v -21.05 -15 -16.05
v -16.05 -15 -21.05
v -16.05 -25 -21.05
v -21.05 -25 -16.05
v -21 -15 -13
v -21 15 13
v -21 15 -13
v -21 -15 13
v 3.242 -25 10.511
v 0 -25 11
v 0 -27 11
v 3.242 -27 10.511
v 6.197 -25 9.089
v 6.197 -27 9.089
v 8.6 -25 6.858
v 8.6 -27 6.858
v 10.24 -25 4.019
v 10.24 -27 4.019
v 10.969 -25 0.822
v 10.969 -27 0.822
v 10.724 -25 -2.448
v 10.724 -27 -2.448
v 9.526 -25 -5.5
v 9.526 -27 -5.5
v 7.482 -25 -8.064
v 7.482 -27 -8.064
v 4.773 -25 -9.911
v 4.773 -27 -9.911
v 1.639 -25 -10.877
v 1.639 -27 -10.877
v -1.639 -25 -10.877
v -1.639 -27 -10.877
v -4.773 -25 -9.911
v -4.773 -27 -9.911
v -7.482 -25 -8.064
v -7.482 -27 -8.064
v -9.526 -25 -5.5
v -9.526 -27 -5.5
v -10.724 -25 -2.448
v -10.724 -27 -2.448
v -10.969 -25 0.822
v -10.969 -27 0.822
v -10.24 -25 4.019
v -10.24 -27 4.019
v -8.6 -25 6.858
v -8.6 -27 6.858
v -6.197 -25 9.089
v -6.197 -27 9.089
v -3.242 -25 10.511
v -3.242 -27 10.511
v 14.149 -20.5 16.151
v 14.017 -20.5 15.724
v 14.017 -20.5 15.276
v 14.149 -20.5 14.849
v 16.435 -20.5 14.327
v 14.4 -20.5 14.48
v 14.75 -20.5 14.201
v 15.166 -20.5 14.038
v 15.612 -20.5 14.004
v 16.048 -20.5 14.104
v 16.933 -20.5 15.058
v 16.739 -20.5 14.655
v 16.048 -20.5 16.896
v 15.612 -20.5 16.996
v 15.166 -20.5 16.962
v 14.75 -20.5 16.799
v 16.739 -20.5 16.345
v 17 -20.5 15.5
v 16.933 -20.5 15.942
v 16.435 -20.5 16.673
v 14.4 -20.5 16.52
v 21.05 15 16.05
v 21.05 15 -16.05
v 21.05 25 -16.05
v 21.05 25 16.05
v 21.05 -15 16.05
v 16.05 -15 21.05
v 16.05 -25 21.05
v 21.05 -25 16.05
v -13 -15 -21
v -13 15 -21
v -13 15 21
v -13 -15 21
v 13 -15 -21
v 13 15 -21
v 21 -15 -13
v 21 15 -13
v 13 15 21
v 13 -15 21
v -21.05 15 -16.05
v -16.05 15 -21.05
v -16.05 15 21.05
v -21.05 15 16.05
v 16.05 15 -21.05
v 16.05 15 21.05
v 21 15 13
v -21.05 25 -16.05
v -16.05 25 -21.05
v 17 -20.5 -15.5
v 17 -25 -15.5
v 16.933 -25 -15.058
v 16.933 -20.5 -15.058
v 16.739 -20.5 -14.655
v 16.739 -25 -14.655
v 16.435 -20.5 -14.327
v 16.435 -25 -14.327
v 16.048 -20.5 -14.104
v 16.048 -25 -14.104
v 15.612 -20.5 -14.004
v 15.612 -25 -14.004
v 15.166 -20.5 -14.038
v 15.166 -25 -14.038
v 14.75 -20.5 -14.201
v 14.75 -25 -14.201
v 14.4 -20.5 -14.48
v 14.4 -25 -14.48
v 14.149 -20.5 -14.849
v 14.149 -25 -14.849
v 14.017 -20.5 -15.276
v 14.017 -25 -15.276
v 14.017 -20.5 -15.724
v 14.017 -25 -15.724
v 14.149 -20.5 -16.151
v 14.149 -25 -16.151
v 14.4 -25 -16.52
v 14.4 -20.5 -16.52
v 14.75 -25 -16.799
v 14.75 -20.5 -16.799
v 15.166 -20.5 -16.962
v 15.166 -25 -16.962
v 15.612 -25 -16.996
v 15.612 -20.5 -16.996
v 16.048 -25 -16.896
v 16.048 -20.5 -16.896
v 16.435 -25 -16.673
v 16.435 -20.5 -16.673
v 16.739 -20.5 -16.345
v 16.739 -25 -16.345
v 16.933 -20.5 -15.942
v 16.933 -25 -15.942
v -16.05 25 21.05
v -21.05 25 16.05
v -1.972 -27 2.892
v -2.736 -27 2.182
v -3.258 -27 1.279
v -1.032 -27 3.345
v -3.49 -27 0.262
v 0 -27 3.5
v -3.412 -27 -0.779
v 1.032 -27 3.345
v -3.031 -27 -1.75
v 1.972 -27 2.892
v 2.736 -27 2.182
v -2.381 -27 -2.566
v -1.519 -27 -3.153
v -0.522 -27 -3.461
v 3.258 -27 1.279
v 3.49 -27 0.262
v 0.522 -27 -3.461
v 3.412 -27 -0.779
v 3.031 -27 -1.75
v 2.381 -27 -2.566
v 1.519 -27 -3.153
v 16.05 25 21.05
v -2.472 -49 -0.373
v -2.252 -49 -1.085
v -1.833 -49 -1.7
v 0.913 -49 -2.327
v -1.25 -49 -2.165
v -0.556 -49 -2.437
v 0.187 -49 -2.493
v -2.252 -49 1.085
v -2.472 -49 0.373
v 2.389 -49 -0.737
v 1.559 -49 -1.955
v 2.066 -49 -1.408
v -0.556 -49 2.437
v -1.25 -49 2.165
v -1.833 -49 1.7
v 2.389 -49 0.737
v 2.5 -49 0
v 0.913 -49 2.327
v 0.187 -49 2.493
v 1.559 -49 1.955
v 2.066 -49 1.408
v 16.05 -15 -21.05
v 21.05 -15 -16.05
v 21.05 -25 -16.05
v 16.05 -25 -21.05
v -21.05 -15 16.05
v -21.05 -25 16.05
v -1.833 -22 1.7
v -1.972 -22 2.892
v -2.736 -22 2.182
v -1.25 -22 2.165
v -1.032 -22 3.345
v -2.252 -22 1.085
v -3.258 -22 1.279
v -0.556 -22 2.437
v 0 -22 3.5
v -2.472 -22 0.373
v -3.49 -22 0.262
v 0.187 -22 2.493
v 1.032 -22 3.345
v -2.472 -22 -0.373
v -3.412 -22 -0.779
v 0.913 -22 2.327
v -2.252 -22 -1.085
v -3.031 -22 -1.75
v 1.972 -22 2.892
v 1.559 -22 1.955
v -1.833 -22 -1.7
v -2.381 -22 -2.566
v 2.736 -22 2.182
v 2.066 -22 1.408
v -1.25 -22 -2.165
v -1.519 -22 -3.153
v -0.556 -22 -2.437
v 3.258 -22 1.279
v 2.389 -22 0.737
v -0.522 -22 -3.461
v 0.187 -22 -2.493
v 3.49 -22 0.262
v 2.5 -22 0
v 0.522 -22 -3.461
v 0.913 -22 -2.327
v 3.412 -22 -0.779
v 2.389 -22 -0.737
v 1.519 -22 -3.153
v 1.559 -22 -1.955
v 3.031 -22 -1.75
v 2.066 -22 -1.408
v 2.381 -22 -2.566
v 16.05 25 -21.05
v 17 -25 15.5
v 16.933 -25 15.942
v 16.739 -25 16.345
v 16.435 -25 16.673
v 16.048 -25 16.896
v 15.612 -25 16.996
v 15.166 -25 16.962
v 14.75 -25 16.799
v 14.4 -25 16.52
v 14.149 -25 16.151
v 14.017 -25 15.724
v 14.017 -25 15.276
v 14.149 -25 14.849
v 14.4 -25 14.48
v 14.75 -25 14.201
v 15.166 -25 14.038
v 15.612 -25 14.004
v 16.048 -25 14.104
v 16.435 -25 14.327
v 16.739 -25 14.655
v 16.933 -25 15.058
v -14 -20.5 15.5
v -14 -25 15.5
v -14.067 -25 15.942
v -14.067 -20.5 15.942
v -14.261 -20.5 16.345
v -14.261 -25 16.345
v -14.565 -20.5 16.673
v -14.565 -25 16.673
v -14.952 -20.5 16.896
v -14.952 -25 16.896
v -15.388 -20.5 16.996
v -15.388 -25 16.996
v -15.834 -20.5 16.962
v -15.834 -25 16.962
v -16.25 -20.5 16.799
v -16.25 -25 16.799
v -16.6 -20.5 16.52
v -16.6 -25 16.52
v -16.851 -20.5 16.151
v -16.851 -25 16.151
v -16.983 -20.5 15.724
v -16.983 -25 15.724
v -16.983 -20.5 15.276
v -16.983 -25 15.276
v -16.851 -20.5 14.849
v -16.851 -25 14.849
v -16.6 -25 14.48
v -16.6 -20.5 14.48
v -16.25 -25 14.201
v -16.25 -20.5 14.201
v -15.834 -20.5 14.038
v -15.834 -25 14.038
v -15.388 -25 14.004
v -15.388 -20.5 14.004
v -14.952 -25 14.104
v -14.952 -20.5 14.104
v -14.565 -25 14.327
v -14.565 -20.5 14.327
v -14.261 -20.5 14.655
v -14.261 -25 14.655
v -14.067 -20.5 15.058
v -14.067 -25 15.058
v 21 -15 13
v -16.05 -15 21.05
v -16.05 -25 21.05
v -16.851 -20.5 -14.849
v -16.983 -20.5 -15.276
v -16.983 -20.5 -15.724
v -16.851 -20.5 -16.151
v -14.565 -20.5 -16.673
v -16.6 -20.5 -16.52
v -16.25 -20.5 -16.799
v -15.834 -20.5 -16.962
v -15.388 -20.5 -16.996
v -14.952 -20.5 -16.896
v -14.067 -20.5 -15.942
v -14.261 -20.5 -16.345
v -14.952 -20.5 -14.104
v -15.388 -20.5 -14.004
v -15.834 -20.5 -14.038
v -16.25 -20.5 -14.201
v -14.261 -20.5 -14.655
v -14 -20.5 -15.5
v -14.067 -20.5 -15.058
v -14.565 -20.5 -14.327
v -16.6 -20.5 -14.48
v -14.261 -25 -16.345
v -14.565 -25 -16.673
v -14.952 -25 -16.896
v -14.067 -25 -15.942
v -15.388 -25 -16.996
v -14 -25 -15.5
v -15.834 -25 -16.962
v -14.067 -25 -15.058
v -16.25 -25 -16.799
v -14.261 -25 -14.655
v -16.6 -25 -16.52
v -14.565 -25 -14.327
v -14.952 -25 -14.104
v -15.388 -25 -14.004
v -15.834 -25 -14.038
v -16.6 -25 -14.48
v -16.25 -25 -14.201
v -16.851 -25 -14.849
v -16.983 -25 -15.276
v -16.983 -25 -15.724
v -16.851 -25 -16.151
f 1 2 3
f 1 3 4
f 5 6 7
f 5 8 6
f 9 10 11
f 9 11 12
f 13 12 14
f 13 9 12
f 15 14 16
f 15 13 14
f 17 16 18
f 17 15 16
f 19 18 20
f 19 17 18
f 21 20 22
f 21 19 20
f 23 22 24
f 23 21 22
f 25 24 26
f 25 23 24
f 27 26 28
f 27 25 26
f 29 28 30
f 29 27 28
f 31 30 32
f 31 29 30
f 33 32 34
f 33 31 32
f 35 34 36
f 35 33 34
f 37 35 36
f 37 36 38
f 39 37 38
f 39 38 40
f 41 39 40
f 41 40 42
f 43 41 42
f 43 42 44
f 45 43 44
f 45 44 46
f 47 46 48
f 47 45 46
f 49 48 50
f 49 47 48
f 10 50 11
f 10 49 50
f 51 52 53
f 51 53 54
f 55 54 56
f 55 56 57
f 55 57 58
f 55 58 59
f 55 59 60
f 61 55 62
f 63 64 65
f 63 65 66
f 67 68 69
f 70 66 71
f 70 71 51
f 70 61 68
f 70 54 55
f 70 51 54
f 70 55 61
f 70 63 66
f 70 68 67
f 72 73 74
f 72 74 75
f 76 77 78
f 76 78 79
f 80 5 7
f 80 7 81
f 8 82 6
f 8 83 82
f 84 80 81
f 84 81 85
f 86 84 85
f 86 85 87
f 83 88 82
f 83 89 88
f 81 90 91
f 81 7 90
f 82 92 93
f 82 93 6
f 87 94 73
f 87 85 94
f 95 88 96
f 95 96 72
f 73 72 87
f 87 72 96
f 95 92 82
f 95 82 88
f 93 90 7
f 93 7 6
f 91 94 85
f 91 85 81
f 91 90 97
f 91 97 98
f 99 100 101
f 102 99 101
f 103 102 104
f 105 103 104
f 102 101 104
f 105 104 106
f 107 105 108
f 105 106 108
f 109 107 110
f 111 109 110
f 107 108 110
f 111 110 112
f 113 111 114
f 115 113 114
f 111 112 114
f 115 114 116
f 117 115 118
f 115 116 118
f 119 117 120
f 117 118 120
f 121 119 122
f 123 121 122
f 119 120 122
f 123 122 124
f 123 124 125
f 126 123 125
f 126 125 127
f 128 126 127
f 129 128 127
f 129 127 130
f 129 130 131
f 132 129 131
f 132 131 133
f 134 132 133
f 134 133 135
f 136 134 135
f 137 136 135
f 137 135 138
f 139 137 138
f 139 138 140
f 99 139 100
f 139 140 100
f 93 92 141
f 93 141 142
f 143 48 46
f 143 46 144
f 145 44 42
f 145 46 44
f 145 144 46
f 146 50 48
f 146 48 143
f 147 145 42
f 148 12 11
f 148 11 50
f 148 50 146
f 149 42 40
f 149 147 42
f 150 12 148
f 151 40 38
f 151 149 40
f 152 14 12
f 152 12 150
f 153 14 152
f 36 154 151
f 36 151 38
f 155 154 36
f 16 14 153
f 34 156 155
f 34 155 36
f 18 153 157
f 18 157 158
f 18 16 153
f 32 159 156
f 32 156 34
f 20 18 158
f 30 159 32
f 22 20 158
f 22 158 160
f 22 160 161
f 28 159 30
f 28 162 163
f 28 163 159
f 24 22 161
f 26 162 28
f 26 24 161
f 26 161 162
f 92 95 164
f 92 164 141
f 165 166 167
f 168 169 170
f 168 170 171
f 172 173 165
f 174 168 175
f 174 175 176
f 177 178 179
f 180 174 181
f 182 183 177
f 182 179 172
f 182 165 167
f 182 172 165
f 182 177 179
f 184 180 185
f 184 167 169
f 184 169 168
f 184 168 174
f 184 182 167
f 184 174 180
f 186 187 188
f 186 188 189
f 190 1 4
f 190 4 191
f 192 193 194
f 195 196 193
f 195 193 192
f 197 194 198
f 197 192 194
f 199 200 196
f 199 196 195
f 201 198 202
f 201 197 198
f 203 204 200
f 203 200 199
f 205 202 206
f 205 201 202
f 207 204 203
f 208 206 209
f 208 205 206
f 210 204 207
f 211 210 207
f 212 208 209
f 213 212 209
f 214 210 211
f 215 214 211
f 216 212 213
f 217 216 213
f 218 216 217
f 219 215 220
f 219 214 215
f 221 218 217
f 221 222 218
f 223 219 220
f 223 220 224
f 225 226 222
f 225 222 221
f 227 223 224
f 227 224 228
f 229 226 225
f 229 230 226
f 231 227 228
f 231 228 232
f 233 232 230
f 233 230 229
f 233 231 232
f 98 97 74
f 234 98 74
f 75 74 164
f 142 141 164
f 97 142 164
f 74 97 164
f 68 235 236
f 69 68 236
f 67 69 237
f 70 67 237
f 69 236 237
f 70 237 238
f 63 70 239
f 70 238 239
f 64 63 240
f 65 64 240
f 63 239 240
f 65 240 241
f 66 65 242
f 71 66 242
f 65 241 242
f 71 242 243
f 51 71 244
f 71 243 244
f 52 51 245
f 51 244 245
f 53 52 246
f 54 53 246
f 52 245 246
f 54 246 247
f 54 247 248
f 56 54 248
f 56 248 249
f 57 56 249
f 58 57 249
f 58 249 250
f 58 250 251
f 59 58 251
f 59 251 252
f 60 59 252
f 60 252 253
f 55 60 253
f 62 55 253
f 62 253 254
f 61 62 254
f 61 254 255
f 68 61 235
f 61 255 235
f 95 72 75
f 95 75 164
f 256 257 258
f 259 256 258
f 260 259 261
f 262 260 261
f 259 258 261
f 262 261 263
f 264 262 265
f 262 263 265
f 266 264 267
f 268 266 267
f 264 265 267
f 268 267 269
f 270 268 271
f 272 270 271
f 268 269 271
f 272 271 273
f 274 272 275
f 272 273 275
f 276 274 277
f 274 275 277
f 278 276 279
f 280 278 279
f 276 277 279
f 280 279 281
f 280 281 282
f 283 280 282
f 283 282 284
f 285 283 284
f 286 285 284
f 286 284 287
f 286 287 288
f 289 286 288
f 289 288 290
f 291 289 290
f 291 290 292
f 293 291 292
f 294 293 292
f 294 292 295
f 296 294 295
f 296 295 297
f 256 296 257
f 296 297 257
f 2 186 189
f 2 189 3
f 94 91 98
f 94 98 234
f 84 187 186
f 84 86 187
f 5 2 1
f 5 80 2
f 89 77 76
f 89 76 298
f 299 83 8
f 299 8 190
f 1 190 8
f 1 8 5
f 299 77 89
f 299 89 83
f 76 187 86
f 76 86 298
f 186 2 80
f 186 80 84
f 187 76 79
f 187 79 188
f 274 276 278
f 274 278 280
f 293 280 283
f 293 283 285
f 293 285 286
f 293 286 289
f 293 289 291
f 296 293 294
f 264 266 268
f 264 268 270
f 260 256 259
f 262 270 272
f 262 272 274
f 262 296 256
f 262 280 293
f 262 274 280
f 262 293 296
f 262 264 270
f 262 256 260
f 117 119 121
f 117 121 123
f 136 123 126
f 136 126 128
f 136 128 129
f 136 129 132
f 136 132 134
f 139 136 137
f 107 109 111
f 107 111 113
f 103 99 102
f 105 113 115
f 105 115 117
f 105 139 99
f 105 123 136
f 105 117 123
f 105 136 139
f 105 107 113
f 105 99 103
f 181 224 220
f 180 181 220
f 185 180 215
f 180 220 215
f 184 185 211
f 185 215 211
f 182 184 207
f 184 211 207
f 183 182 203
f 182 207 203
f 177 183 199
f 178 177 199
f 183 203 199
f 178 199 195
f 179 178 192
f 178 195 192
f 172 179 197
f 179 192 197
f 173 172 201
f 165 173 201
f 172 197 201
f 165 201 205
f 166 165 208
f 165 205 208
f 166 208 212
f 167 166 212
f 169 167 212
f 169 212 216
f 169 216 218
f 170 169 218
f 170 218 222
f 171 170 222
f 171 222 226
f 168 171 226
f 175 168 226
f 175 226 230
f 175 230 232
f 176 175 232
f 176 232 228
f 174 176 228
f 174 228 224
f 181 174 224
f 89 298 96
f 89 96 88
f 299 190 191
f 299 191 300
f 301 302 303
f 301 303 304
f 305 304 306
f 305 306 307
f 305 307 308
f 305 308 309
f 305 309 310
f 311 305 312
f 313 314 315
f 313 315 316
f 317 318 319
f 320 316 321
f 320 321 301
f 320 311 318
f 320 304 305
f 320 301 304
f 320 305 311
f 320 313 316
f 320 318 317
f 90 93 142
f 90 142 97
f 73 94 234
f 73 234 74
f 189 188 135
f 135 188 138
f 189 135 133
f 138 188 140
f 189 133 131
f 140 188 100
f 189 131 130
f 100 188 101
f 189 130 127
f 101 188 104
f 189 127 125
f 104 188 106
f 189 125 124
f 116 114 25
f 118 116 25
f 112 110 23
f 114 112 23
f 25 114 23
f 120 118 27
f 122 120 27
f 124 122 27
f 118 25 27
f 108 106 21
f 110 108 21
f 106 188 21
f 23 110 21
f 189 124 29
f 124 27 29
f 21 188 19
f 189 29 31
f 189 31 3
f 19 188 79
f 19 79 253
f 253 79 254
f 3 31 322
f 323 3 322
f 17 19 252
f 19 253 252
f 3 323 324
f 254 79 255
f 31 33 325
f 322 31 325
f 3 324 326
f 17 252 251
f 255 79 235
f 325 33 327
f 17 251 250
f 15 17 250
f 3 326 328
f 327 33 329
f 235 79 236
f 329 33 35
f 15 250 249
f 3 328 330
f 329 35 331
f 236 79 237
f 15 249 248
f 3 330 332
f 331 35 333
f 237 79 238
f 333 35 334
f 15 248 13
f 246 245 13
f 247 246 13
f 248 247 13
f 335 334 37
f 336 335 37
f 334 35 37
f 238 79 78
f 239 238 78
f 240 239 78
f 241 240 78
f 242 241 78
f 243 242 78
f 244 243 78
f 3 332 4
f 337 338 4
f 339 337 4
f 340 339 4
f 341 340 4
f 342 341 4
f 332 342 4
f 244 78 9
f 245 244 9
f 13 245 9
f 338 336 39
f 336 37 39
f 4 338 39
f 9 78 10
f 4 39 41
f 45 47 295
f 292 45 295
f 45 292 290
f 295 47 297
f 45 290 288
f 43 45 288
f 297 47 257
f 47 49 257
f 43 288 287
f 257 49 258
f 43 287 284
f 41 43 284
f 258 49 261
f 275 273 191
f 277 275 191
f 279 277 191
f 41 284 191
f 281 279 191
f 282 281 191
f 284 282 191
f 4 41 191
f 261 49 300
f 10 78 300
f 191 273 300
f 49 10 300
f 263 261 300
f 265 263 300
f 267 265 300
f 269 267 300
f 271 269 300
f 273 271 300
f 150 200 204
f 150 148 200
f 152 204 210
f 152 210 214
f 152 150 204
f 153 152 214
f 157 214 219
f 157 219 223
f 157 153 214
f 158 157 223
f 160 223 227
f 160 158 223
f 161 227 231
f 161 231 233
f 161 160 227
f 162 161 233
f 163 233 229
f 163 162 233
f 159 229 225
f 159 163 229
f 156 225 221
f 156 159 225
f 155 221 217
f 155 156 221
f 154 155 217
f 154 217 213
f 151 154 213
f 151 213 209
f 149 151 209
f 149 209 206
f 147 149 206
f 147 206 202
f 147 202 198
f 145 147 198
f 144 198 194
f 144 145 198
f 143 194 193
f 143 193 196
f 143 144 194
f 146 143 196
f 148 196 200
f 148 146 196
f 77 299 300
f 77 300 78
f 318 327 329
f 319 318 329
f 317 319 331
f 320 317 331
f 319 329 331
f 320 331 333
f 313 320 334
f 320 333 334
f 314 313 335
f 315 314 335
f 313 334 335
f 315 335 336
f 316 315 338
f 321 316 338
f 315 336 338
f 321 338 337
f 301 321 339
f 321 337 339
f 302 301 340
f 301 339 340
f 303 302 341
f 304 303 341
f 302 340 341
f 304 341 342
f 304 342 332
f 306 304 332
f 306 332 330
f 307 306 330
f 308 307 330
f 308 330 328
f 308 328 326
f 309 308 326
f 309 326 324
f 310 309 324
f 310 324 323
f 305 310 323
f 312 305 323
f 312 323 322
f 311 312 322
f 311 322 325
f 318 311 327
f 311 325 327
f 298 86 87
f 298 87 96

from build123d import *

# Parameters (mm, degrees)
SKETCH005_R  = 2.5
PAD003_DEPTH = 49
SKETCH002_R  = 11
PAD001_DEPTH = 10
SKETCH003_R  = 1.5
POCKET_DEPTH = 4.5
PAD_DEPTH    = 15
PAD002_DEPTH = 10


with BuildPart() as shaft:
    # Sketch005 → Pad003 (new body)
    with BuildSketch(Plane.XZ):
        Circle(SKETCH005_R)
    extrude(amount=PAD003_DEPTH)


with BuildPart() as front_holes:
    # Sketch002 → Pad001 (new body)
    with BuildSketch(Plane.XZ.offset(15)):
        Polygon((-21.05, -16.05), (-21.05, 16.05), (-16.05, 21.05), (16.05, 21.05), (21.05, 16.05), (21.05, -16.05), (16.05, -21.05), (-16.05, -21.05), align=None)
        Circle(SKETCH002_R, mode=Mode.SUBTRACT)
    extrude(amount=PAD001_DEPTH)

    # Sketch003 → Pocket (cut)
    with BuildSketch(Plane.XZ.offset(25)):
        with Locations((-15.5, 15.5)):
            Circle(SKETCH003_R)
        with Locations((15.5, 15.5)):
            Circle(SKETCH003_R)
        with Locations((-15.5, -15.5)):
            Circle(SKETCH003_R)
        with Locations((15.5, -15.5)):
            Circle(SKETCH003_R)
    extrude(amount=-POCKET_DEPTH, mode=Mode.SUBTRACT)


with BuildPart() as center:
    # Sketch001 → Revolution (revolve)
    with BuildSketch(Plane.YZ):
        Polygon((-24, 12), (0, 12), (0, 0), (-22, 0), (-22, 3.5), (-27, 3.5), (-27, 11), (-24, 11), align=None)
    revolve(axis=Axis((0, 0, 0), (0, 1, 0)))


with BuildPart() as front_middle_center:
    # Sketch → Pad (new body, symmetric)
    with BuildSketch(Plane.XZ):
        Polygon((-21, 13), (-21, -13), (-13, -21), (13, -21), (21, -13), (21, 13), (13, 21), (-13, 21), align=None)
    extrude(amount=PAD_DEPTH, both=True)

    # Fusion: union center
    add(center.part)

    # Fusion001: union front-holes
    add(front_holes.part)


with BuildPart() as nema17:
    # Sketch004 → Pad002 (new body)
    with BuildSketch(Plane(origin=(0, 15, 0), x_dir=(-1, 0, 0), z_dir=(0, 1, 0))):
        Polygon((-21.05, -16.05), (-21.05, 16.05), (-16.05, 21.05), (16.05, 21.05), (21.05, 16.05), (21.05, -16.05), (16.05, -21.05), (-16.05, -21.05), align=None)
    extrude(amount=PAD002_DEPTH)

    # Fusion002: union front-middle-center
    add(front_middle_center.part)

    # Fusion003: union shaft
    add(shaft.part)


solid = nema17.part
